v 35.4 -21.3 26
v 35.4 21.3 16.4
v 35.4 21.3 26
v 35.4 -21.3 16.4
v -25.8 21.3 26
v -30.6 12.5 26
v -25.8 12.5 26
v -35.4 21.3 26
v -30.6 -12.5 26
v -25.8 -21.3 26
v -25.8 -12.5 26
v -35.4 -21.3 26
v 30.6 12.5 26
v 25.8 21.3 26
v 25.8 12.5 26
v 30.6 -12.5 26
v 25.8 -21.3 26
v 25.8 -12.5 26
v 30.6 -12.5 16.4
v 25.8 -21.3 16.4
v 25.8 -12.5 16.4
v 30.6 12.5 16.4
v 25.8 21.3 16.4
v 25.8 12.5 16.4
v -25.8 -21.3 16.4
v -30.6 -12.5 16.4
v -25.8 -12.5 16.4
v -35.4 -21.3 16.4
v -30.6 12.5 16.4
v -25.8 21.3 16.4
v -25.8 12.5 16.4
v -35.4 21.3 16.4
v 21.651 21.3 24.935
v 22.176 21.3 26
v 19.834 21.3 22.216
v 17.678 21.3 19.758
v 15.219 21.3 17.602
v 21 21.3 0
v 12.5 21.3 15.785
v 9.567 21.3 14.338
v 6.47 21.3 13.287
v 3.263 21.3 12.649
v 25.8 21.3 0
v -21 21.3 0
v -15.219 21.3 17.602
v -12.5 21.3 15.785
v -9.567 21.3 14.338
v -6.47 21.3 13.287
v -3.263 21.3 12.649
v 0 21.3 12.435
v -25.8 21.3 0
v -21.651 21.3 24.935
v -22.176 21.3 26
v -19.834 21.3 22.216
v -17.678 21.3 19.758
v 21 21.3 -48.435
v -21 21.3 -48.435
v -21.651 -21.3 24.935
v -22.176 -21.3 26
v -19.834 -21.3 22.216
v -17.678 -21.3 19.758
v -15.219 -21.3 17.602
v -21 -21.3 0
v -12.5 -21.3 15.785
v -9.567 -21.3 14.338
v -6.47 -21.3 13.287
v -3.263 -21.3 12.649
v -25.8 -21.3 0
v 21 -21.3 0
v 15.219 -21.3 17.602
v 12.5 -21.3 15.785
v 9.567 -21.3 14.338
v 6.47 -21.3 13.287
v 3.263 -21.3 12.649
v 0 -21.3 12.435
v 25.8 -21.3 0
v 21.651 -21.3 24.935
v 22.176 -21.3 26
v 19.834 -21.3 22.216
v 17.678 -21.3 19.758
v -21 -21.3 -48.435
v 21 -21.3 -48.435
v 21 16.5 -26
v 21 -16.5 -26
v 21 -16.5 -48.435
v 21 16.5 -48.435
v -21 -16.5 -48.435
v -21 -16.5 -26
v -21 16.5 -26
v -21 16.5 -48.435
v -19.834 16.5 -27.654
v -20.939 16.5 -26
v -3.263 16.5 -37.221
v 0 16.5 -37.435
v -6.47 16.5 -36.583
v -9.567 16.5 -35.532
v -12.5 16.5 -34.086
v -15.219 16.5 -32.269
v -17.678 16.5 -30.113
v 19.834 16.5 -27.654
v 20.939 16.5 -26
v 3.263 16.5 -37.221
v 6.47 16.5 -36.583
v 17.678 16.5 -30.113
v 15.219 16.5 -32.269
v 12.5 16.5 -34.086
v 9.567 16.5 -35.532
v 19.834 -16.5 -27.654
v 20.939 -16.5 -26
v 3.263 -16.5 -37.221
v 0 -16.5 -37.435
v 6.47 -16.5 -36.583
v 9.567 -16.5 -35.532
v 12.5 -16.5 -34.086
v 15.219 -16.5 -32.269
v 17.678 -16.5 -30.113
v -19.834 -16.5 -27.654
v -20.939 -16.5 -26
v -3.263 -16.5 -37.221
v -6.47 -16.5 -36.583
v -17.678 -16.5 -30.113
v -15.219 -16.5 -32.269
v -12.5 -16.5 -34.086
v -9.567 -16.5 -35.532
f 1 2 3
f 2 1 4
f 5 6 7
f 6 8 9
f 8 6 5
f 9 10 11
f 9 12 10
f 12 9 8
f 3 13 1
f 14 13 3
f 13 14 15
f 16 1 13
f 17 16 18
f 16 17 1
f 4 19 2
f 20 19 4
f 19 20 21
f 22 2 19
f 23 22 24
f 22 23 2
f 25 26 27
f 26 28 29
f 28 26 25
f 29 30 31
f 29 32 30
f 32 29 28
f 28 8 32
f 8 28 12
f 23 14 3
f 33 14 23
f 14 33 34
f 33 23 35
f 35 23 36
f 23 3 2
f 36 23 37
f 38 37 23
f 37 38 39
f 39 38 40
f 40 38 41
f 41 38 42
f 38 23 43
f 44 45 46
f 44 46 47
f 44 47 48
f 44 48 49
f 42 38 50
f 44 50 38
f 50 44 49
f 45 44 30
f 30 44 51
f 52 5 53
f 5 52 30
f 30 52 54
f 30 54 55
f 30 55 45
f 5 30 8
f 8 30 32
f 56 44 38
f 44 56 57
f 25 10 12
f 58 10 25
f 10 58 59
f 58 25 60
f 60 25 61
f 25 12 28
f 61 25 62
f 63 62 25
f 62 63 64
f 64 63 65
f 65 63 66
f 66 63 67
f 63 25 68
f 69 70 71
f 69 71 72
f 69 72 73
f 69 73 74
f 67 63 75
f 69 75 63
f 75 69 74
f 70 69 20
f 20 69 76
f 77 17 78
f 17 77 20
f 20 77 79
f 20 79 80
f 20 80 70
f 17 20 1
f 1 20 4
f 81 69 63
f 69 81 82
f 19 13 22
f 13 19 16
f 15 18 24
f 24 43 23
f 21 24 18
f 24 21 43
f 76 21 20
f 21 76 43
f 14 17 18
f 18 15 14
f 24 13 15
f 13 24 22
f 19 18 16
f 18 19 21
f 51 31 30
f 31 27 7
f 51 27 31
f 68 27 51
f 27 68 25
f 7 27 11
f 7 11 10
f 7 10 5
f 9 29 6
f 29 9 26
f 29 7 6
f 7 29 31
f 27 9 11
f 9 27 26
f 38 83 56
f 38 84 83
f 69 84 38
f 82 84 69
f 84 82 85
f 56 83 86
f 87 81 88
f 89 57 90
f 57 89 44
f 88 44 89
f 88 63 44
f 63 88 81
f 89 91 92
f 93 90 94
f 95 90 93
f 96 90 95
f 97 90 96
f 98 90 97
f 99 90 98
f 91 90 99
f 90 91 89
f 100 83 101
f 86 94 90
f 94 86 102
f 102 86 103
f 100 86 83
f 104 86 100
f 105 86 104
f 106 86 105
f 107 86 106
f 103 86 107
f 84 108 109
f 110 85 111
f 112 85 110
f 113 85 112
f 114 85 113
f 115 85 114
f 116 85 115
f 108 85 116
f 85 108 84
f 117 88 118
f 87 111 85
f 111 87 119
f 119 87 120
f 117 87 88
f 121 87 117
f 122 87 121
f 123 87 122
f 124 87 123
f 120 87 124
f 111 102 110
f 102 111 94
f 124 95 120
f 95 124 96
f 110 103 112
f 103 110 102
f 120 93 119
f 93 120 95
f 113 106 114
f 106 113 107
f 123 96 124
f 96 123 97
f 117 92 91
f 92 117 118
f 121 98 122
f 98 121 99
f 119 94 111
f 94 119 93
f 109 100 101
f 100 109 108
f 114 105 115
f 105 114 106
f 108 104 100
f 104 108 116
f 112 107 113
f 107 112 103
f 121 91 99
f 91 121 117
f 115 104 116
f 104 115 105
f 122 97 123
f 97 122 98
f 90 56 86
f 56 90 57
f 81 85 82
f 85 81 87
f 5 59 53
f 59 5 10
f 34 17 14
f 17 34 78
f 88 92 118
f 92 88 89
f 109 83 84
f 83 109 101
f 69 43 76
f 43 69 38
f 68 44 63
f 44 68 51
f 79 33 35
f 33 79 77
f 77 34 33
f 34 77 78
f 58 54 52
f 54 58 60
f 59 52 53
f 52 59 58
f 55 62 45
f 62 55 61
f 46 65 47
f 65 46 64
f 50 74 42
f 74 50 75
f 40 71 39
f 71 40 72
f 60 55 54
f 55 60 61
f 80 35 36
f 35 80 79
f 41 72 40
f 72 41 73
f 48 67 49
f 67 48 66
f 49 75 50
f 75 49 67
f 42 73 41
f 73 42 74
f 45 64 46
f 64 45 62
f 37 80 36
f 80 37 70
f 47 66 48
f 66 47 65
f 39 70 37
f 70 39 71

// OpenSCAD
length = 42;
cradle_side_thickness = 4.8;
cradle_thickness = 33;
height = 52;
cradle_radius = 25;
strap_width = 25;
side_wall_height = 11;

$fn = 48;

difference() {
  union() {
    strap_ring();
    cube([
           length,
           cradle_thickness + 2 * cradle_side_thickness,
           height],
         true);
    translate([0, 0, height / 4]) {
      cube([
             length + 2 * cradle_side_thickness,
              cradle_thickness + 2 * cradle_side_thickness,
              height/2],
           true);
    }
    translate([
                0,
                0,
                height / -2 + sqrt(cradle_radius * cradle_radius - (length * length / 4))
                ]) {
      intersection() {
        cube([
               length,
               cradle_thickness,
               2 * cradle_radius],
             true);
        rotate([
                90,
                0,
                0]) {
          cylinder(
            r = cradle_radius,
            h = cradle_thickness + 2 * cradle_side_thickness,
            center = true);
        }
      }
    }
    translate([
                 0,
                 0,
                 0 - side_wall_height
                 - (cradle_radius - sqrt(cradle_radius * cradle_radius - (length * length / 4)))]) {
      difference() {
        cube([
              length,
              cradle_thickness + 2 * cradle_side_thickness,
              height],
            true);
        cube([
               length + 0.1,
               cradle_thickness,
               height + 0.1],
             true);
      }
    }
  }

  translate([
              0,
              0,
              height / 2 + cradle_radius
              - sqrt(cradle_radius * cradle_radius - (length * length / 4))]) {
    rotate([
             90,
             0,
             0]) {
      cylinder(
        r = cradle_radius,
        h = cradle_thickness + 2 * cradle_side_thickness + 0.1,
        center = true);
    }
  }
}

module strap_ring() {
  translate([0, 0, height / 2 - cradle_side_thickness]) {
    difference() {
      cube([
            length + 6 * cradle_side_thickness,
            cradle_thickness + 2 * cradle_side_thickness,
            2 * cradle_side_thickness],
          true);
      translate([(length + 3 * cradle_side_thickness) / 2, 0, 0]) {
        cube([
              cradle_side_thickness,
              strap_width,
              2 * cradle_side_thickness + 0.1],
            true);
      }
      translate([(length + 3 * cradle_side_thickness) / - 2, 0, 0]) {
        cube([
              cradle_side_thickness,
              strap_width,
              2 * cradle_side_thickness + 0.1],
            true);
      }
    }
  }
}
